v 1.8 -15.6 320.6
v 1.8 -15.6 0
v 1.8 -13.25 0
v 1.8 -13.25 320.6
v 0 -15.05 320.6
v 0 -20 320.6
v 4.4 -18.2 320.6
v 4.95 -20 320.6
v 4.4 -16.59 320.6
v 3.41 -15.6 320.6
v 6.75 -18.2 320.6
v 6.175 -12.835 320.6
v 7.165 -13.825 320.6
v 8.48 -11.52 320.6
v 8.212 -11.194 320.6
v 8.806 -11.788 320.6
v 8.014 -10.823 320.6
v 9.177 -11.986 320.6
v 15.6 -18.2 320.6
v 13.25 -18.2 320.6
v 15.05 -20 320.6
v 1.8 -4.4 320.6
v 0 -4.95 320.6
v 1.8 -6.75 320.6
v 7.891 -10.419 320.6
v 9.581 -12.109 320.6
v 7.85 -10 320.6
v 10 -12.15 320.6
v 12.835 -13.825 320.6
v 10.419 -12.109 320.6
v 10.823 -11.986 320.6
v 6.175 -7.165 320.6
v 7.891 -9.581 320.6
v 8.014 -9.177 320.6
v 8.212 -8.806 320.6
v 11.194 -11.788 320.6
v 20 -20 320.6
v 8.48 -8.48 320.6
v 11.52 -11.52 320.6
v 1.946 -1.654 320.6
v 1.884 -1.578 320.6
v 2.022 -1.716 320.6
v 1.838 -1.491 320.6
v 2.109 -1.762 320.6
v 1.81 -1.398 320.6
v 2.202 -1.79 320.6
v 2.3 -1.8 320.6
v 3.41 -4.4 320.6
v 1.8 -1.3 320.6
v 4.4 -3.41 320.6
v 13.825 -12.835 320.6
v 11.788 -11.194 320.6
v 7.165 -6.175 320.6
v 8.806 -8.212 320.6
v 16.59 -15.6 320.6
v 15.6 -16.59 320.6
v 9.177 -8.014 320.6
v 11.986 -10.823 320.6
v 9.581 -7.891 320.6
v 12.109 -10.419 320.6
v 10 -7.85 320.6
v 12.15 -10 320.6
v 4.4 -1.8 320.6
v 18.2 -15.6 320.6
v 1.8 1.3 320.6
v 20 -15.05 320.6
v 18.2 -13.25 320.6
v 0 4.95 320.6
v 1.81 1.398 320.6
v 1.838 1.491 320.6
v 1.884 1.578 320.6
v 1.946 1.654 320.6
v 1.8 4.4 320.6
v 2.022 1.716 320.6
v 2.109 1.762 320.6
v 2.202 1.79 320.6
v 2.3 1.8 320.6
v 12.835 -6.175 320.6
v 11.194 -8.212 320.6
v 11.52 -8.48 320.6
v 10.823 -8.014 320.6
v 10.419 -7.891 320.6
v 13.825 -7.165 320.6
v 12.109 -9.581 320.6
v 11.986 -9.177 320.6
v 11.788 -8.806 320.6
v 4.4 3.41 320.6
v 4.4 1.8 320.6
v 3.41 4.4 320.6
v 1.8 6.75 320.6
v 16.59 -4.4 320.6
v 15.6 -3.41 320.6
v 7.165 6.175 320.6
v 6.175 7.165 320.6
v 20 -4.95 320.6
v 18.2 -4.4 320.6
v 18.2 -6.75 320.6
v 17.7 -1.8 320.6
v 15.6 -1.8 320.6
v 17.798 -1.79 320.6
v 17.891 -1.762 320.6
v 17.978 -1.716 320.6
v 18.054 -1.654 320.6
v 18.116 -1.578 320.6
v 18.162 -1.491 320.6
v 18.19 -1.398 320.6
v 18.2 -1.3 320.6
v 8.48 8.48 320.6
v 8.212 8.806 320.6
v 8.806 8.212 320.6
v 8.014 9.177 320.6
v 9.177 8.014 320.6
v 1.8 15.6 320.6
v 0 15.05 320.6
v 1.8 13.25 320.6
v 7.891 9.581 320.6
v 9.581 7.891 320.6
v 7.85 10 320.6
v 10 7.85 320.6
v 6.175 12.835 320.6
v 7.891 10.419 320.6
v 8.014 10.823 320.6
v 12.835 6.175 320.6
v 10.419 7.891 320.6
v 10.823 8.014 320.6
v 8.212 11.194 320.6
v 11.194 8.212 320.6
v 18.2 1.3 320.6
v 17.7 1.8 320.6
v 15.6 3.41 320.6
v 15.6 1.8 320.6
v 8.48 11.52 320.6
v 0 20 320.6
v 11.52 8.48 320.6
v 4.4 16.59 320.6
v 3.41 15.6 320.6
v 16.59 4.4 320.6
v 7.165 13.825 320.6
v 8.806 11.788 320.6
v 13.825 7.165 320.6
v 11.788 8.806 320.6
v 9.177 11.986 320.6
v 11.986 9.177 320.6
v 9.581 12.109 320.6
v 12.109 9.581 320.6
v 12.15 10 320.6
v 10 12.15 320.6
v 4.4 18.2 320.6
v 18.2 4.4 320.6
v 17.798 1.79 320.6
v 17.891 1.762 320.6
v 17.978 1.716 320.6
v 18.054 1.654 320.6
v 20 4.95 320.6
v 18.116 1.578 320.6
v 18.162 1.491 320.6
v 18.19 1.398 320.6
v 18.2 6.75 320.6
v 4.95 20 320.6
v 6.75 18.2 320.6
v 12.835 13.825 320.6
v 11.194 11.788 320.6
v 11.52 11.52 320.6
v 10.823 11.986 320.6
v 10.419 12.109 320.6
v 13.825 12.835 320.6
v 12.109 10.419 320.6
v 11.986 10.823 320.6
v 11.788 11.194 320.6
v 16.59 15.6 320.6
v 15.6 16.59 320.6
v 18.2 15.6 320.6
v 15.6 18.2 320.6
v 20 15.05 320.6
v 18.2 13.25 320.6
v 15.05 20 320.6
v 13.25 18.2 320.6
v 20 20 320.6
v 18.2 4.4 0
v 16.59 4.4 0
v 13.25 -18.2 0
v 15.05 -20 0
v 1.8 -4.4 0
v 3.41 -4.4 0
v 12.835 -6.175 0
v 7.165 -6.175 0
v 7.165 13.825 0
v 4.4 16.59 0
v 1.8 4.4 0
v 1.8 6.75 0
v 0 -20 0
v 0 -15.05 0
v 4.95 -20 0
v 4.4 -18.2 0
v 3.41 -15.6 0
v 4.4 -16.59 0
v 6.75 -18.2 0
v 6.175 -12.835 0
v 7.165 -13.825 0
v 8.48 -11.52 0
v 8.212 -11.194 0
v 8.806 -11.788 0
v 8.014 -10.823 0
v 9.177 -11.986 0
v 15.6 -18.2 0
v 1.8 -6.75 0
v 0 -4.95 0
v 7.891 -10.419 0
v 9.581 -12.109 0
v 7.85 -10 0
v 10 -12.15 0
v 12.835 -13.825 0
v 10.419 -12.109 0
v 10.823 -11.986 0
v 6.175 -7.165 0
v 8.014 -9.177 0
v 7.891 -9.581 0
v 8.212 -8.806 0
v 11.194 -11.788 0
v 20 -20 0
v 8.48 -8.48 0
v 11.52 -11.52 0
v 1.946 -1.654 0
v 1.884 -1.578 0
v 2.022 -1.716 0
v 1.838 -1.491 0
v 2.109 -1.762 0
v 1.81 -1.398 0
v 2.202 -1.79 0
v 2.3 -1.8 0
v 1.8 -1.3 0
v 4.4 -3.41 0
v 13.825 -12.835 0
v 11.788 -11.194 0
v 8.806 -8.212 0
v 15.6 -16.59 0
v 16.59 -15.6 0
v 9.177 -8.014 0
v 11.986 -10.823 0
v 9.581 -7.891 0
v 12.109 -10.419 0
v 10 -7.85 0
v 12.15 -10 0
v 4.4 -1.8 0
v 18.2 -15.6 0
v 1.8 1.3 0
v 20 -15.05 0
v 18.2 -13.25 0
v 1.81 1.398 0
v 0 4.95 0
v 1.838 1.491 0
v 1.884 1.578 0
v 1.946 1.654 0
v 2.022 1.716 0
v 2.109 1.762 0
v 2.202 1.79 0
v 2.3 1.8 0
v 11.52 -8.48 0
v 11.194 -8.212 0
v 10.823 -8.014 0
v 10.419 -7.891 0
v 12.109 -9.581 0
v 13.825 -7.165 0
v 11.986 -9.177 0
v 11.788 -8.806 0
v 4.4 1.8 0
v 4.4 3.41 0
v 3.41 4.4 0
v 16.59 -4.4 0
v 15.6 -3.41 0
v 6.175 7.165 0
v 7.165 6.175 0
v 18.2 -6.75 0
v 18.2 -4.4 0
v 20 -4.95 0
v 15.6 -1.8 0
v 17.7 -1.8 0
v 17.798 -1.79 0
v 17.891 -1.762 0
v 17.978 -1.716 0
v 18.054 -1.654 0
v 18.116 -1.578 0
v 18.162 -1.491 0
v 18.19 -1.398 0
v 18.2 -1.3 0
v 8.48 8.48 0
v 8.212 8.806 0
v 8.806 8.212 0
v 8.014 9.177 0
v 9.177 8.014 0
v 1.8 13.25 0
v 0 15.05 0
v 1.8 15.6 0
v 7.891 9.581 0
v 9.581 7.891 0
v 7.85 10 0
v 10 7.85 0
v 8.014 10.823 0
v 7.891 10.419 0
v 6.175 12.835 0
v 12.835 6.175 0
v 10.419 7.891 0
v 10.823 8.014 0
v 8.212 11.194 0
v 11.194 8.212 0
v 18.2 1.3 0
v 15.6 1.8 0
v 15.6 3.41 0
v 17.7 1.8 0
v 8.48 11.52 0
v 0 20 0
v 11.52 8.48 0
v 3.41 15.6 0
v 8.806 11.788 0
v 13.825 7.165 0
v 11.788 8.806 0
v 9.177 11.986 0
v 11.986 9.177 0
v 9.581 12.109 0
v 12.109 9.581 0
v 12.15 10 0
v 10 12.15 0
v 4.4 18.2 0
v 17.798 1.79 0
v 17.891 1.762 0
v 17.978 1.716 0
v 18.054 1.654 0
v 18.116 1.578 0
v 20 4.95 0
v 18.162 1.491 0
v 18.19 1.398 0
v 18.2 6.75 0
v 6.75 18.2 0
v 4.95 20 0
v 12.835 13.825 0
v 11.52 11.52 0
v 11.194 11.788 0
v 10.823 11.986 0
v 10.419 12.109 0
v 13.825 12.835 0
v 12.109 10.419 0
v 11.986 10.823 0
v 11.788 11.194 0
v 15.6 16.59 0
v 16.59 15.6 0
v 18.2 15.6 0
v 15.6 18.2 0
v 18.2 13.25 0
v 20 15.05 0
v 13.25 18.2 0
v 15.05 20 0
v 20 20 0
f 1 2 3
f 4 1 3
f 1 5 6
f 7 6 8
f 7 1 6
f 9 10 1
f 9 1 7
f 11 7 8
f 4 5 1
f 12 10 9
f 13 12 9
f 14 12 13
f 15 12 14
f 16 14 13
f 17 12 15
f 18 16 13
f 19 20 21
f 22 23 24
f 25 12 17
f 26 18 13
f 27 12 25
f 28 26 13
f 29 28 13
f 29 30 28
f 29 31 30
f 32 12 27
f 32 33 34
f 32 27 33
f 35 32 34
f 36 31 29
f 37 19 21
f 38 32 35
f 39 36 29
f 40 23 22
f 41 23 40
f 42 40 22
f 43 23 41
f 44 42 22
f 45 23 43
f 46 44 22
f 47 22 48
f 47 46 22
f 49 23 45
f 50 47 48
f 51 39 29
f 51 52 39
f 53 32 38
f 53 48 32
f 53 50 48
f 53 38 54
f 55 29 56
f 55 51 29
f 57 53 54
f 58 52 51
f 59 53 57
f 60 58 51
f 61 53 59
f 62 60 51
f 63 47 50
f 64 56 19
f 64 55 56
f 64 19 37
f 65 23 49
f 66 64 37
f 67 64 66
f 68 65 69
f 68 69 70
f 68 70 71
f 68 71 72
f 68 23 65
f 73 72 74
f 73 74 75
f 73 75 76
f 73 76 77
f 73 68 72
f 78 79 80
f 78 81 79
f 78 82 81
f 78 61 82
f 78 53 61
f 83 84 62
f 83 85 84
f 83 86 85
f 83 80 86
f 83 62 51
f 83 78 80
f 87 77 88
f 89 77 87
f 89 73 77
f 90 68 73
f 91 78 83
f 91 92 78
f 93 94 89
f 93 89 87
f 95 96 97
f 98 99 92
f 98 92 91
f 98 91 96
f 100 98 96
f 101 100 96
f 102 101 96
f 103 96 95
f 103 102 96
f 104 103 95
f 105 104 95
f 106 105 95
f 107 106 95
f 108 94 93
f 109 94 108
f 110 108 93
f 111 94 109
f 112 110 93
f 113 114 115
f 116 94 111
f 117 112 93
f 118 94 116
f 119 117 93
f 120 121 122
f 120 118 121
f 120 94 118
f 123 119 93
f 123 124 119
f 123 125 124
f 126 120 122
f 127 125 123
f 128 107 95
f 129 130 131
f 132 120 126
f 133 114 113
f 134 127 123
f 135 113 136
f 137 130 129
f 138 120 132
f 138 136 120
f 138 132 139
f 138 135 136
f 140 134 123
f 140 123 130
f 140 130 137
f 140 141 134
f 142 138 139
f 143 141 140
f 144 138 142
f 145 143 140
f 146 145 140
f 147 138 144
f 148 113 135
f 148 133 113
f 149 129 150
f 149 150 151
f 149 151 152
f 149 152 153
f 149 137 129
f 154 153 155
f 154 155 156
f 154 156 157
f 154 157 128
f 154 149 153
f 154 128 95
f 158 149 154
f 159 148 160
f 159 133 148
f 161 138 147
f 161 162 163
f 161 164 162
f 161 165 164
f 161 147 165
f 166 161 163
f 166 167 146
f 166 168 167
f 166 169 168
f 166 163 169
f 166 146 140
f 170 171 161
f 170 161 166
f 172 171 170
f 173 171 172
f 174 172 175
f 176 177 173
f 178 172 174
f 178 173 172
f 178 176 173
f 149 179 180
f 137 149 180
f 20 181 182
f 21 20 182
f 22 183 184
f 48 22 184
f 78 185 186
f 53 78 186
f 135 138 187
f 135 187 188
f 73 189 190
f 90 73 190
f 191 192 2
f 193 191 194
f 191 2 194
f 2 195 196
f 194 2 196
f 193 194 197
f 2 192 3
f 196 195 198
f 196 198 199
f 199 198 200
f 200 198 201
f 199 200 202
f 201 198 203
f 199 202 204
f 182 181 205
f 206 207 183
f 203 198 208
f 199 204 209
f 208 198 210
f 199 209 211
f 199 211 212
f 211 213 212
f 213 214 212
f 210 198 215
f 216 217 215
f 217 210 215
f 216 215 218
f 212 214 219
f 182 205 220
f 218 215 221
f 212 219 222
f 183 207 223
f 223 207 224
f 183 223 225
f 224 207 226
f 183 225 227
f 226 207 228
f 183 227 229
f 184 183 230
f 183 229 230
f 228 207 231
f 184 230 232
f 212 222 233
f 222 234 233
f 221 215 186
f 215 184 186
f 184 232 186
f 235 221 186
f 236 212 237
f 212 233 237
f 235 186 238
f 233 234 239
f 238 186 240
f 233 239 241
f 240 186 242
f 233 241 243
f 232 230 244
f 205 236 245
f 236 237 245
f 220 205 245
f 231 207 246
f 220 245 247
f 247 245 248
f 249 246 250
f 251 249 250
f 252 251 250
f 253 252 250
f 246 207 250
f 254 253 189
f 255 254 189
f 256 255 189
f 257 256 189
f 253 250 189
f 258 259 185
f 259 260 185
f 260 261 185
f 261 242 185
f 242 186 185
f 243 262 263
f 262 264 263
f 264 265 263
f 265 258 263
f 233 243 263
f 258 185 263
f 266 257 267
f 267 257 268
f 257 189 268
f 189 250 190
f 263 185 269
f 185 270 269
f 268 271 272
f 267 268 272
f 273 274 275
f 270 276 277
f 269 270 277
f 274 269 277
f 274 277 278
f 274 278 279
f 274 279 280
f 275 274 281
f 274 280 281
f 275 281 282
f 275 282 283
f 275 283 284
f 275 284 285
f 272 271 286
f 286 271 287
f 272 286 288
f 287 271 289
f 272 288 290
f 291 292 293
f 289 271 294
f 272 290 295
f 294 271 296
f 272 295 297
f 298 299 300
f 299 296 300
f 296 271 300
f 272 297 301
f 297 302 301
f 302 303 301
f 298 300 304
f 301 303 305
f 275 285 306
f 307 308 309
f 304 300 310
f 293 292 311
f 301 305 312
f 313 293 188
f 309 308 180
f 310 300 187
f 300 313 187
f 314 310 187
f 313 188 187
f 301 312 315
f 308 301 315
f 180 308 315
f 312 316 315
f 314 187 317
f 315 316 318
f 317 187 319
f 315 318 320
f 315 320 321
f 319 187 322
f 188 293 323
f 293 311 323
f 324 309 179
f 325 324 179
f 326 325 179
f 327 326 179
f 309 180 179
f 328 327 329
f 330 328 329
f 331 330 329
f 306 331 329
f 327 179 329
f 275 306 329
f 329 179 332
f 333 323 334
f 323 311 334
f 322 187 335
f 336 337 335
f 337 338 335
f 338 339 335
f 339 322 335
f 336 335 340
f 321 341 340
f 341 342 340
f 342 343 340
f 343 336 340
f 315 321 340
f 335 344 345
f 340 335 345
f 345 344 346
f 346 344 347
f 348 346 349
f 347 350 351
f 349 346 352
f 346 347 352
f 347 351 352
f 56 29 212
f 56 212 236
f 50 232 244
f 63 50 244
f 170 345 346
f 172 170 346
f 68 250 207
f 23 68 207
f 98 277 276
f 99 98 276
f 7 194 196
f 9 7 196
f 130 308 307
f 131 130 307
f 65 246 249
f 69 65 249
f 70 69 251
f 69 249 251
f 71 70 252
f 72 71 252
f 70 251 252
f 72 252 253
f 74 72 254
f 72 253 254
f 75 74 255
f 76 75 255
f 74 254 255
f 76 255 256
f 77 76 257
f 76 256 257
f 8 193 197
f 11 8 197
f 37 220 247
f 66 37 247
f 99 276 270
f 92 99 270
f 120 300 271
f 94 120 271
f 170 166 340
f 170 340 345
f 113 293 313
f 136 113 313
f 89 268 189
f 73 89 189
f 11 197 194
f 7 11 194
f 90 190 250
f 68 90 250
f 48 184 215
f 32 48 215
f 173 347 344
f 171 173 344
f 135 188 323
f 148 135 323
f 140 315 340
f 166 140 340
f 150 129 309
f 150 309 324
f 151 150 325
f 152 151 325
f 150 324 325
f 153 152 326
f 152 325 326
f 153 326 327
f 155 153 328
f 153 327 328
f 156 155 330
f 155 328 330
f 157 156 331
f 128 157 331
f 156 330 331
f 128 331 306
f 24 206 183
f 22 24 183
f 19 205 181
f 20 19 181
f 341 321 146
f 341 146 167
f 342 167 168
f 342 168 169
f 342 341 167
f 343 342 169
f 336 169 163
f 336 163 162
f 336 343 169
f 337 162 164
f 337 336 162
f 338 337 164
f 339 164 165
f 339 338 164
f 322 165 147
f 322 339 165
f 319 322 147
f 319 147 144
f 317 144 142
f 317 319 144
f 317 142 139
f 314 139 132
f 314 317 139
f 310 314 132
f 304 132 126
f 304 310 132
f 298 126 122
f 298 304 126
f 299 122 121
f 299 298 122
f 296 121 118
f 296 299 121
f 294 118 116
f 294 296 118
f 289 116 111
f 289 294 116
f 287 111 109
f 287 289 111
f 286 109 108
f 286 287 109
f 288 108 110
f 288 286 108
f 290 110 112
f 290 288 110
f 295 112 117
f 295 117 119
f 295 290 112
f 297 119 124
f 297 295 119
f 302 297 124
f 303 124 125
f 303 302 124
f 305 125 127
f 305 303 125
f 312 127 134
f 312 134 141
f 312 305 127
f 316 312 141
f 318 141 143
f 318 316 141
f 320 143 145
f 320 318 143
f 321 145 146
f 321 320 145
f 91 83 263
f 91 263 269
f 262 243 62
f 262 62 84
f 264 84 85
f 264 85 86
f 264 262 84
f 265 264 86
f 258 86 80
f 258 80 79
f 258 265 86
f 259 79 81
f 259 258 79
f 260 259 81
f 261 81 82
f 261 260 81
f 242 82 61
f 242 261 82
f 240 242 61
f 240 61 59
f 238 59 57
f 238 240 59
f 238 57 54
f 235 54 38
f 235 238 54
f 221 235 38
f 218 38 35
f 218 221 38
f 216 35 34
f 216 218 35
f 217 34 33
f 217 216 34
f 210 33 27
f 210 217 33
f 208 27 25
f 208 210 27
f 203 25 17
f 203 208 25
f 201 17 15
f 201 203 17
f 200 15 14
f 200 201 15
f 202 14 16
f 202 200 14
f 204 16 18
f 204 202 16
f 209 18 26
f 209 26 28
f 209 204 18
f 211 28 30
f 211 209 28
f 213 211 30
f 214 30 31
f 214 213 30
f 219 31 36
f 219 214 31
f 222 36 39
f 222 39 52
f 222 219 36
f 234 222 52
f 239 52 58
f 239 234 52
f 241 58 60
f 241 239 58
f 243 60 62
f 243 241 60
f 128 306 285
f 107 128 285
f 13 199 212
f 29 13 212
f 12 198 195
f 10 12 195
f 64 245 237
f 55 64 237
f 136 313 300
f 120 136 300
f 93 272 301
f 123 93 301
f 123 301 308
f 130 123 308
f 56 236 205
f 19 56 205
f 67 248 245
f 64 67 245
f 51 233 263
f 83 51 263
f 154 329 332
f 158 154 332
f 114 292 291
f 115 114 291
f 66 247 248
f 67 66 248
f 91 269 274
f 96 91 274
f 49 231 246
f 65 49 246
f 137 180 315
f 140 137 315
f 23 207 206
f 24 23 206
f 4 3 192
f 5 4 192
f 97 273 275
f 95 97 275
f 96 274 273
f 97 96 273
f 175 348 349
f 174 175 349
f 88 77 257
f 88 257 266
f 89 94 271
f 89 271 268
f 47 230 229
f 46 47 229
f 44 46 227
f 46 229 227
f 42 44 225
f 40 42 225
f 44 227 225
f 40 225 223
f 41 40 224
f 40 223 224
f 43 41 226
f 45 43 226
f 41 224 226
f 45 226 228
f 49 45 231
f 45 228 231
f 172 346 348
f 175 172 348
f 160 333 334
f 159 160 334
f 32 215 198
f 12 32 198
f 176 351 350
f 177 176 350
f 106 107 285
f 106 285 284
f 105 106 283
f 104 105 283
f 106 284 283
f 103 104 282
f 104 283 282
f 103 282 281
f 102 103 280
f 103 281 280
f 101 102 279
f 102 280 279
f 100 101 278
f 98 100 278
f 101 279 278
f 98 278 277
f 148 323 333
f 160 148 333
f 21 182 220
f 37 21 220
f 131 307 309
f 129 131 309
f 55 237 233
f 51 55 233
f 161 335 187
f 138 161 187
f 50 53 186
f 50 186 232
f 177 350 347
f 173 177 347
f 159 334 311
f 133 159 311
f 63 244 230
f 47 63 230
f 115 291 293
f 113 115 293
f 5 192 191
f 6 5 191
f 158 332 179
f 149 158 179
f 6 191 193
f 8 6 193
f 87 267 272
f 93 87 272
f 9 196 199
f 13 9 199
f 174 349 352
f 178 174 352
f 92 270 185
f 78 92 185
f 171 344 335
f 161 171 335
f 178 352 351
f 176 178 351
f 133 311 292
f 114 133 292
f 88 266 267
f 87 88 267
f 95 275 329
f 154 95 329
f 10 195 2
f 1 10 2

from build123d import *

# Parameters (mm, degrees)
CROQUIS1_R              = 2.15
SALIENTE_EXTRUIR1_DEPTH = 320.6


with BuildPart() as part:
    # Croquis1 → Saliente-Extruir1 (new body)
    with BuildSketch(Plane.XY):
        Polygon((20, 4.95), (18.2, 6.75), (18.2, 4.4), (16.589949494, 4.4), (13.825, 7.164949494), (13.825, 12.835050506), (16.589949494, 15.6), (18.2, 15.6), (18.2, 13.25), (20, 15.05), (20, 20), (15.05, 20), (13.25, 18.2), (15.6, 18.2), (15.6, 16.589949494), (12.835050506, 13.825), (7.164949494, 13.825), (4.4, 16.589949494), (4.4, 18.2), (6.75, 18.2), (4.95, 20), (0, 20), (0, 15.05), (1.8, 13.25), (1.8, 15.6), (3.410050506, 15.6), (6.175, 12.835050506), (6.175, 7.164949494), (3.410050506, 4.4), (1.8, 4.4), (1.8, 6.75), (0, 4.95), (0, -4.95), (1.8, -6.75), (1.8, -4.4), (3.410050506, -4.4), (6.175, -7.164949494), (6.175, -12.835050506), (3.410050506, -15.6), (1.8, -15.6), (1.8, -13.25), (0, -15.05), (0, -20), (4.95, -20), (6.75, -18.2), (4.4, -18.2), (4.4, -16.589949494), (7.164949494, -13.825), (12.835050506, -13.825), (15.6, -16.589949494), (15.6, -18.2), (13.25, -18.2), (15.05, -20), (20, -20), (20, -15.05), (18.2, -13.25), (18.2, -15.6), (16.589949494, -15.6), (13.825, -12.835050506), (13.825, -7.164949494), (16.589949494, -4.4), (18.2, -4.4), (18.2, -6.75), (20, -4.95), align=None)
        with BuildLine():
            Line((1.8, -1.3), (1.8, 1.3))
            ThreePointArc((1.8, 1.3), (1.946446609, 1.653553391), (2.3, 1.8))
            Line((2.3, 1.8), (4.4, 1.8))
            Line((4.4, 1.8), (4.4, 3.410050506))
            Line((4.4, 3.410050506), (7.164949494, 6.175))
            Line((7.164949494, 6.175), (12.835050506, 6.175))
            Line((12.835050506, 6.175), (15.6, 3.410050506))
            Line((15.6, 3.410050506), (15.6, 1.8))
            Line((15.6, 1.8), (17.7, 1.8))
            ThreePointArc((17.7, 1.8), (18.053553391, 1.653553391), (18.2, 1.3))
            Line((18.2, 1.3), (18.2, -1.3))
            ThreePointArc((18.2, -1.3), (18.053553391, -1.653553391), (17.7, -1.8))
            Line((17.7, -1.8), (15.6, -1.8))
            Line((15.6, -1.8), (15.6, -3.410050506))
            Line((15.6, -3.410050506), (12.835050506, -6.175))
            Line((12.835050506, -6.175), (7.164949494, -6.175))
            Line((7.164949494, -6.175), (4.4, -3.410050506))
            Line((4.4, -3.410050506), (4.4, -1.8))
            Line((4.4, -1.8), (2.3, -1.8))
            ThreePointArc((2.3, -1.8), (1.946446609, -1.653553391), (1.8, -1.3))
        make_face(mode=Mode.SUBTRACT)
        with Locations((10, -10)):
            Circle(CROQUIS1_R, mode=Mode.SUBTRACT)
        with Locations((10, 10)):
            Circle(CROQUIS1_R, mode=Mode.SUBTRACT)
    extrude(amount=SALIENTE_EXTRUIR1_DEPTH)


solid = part.part
